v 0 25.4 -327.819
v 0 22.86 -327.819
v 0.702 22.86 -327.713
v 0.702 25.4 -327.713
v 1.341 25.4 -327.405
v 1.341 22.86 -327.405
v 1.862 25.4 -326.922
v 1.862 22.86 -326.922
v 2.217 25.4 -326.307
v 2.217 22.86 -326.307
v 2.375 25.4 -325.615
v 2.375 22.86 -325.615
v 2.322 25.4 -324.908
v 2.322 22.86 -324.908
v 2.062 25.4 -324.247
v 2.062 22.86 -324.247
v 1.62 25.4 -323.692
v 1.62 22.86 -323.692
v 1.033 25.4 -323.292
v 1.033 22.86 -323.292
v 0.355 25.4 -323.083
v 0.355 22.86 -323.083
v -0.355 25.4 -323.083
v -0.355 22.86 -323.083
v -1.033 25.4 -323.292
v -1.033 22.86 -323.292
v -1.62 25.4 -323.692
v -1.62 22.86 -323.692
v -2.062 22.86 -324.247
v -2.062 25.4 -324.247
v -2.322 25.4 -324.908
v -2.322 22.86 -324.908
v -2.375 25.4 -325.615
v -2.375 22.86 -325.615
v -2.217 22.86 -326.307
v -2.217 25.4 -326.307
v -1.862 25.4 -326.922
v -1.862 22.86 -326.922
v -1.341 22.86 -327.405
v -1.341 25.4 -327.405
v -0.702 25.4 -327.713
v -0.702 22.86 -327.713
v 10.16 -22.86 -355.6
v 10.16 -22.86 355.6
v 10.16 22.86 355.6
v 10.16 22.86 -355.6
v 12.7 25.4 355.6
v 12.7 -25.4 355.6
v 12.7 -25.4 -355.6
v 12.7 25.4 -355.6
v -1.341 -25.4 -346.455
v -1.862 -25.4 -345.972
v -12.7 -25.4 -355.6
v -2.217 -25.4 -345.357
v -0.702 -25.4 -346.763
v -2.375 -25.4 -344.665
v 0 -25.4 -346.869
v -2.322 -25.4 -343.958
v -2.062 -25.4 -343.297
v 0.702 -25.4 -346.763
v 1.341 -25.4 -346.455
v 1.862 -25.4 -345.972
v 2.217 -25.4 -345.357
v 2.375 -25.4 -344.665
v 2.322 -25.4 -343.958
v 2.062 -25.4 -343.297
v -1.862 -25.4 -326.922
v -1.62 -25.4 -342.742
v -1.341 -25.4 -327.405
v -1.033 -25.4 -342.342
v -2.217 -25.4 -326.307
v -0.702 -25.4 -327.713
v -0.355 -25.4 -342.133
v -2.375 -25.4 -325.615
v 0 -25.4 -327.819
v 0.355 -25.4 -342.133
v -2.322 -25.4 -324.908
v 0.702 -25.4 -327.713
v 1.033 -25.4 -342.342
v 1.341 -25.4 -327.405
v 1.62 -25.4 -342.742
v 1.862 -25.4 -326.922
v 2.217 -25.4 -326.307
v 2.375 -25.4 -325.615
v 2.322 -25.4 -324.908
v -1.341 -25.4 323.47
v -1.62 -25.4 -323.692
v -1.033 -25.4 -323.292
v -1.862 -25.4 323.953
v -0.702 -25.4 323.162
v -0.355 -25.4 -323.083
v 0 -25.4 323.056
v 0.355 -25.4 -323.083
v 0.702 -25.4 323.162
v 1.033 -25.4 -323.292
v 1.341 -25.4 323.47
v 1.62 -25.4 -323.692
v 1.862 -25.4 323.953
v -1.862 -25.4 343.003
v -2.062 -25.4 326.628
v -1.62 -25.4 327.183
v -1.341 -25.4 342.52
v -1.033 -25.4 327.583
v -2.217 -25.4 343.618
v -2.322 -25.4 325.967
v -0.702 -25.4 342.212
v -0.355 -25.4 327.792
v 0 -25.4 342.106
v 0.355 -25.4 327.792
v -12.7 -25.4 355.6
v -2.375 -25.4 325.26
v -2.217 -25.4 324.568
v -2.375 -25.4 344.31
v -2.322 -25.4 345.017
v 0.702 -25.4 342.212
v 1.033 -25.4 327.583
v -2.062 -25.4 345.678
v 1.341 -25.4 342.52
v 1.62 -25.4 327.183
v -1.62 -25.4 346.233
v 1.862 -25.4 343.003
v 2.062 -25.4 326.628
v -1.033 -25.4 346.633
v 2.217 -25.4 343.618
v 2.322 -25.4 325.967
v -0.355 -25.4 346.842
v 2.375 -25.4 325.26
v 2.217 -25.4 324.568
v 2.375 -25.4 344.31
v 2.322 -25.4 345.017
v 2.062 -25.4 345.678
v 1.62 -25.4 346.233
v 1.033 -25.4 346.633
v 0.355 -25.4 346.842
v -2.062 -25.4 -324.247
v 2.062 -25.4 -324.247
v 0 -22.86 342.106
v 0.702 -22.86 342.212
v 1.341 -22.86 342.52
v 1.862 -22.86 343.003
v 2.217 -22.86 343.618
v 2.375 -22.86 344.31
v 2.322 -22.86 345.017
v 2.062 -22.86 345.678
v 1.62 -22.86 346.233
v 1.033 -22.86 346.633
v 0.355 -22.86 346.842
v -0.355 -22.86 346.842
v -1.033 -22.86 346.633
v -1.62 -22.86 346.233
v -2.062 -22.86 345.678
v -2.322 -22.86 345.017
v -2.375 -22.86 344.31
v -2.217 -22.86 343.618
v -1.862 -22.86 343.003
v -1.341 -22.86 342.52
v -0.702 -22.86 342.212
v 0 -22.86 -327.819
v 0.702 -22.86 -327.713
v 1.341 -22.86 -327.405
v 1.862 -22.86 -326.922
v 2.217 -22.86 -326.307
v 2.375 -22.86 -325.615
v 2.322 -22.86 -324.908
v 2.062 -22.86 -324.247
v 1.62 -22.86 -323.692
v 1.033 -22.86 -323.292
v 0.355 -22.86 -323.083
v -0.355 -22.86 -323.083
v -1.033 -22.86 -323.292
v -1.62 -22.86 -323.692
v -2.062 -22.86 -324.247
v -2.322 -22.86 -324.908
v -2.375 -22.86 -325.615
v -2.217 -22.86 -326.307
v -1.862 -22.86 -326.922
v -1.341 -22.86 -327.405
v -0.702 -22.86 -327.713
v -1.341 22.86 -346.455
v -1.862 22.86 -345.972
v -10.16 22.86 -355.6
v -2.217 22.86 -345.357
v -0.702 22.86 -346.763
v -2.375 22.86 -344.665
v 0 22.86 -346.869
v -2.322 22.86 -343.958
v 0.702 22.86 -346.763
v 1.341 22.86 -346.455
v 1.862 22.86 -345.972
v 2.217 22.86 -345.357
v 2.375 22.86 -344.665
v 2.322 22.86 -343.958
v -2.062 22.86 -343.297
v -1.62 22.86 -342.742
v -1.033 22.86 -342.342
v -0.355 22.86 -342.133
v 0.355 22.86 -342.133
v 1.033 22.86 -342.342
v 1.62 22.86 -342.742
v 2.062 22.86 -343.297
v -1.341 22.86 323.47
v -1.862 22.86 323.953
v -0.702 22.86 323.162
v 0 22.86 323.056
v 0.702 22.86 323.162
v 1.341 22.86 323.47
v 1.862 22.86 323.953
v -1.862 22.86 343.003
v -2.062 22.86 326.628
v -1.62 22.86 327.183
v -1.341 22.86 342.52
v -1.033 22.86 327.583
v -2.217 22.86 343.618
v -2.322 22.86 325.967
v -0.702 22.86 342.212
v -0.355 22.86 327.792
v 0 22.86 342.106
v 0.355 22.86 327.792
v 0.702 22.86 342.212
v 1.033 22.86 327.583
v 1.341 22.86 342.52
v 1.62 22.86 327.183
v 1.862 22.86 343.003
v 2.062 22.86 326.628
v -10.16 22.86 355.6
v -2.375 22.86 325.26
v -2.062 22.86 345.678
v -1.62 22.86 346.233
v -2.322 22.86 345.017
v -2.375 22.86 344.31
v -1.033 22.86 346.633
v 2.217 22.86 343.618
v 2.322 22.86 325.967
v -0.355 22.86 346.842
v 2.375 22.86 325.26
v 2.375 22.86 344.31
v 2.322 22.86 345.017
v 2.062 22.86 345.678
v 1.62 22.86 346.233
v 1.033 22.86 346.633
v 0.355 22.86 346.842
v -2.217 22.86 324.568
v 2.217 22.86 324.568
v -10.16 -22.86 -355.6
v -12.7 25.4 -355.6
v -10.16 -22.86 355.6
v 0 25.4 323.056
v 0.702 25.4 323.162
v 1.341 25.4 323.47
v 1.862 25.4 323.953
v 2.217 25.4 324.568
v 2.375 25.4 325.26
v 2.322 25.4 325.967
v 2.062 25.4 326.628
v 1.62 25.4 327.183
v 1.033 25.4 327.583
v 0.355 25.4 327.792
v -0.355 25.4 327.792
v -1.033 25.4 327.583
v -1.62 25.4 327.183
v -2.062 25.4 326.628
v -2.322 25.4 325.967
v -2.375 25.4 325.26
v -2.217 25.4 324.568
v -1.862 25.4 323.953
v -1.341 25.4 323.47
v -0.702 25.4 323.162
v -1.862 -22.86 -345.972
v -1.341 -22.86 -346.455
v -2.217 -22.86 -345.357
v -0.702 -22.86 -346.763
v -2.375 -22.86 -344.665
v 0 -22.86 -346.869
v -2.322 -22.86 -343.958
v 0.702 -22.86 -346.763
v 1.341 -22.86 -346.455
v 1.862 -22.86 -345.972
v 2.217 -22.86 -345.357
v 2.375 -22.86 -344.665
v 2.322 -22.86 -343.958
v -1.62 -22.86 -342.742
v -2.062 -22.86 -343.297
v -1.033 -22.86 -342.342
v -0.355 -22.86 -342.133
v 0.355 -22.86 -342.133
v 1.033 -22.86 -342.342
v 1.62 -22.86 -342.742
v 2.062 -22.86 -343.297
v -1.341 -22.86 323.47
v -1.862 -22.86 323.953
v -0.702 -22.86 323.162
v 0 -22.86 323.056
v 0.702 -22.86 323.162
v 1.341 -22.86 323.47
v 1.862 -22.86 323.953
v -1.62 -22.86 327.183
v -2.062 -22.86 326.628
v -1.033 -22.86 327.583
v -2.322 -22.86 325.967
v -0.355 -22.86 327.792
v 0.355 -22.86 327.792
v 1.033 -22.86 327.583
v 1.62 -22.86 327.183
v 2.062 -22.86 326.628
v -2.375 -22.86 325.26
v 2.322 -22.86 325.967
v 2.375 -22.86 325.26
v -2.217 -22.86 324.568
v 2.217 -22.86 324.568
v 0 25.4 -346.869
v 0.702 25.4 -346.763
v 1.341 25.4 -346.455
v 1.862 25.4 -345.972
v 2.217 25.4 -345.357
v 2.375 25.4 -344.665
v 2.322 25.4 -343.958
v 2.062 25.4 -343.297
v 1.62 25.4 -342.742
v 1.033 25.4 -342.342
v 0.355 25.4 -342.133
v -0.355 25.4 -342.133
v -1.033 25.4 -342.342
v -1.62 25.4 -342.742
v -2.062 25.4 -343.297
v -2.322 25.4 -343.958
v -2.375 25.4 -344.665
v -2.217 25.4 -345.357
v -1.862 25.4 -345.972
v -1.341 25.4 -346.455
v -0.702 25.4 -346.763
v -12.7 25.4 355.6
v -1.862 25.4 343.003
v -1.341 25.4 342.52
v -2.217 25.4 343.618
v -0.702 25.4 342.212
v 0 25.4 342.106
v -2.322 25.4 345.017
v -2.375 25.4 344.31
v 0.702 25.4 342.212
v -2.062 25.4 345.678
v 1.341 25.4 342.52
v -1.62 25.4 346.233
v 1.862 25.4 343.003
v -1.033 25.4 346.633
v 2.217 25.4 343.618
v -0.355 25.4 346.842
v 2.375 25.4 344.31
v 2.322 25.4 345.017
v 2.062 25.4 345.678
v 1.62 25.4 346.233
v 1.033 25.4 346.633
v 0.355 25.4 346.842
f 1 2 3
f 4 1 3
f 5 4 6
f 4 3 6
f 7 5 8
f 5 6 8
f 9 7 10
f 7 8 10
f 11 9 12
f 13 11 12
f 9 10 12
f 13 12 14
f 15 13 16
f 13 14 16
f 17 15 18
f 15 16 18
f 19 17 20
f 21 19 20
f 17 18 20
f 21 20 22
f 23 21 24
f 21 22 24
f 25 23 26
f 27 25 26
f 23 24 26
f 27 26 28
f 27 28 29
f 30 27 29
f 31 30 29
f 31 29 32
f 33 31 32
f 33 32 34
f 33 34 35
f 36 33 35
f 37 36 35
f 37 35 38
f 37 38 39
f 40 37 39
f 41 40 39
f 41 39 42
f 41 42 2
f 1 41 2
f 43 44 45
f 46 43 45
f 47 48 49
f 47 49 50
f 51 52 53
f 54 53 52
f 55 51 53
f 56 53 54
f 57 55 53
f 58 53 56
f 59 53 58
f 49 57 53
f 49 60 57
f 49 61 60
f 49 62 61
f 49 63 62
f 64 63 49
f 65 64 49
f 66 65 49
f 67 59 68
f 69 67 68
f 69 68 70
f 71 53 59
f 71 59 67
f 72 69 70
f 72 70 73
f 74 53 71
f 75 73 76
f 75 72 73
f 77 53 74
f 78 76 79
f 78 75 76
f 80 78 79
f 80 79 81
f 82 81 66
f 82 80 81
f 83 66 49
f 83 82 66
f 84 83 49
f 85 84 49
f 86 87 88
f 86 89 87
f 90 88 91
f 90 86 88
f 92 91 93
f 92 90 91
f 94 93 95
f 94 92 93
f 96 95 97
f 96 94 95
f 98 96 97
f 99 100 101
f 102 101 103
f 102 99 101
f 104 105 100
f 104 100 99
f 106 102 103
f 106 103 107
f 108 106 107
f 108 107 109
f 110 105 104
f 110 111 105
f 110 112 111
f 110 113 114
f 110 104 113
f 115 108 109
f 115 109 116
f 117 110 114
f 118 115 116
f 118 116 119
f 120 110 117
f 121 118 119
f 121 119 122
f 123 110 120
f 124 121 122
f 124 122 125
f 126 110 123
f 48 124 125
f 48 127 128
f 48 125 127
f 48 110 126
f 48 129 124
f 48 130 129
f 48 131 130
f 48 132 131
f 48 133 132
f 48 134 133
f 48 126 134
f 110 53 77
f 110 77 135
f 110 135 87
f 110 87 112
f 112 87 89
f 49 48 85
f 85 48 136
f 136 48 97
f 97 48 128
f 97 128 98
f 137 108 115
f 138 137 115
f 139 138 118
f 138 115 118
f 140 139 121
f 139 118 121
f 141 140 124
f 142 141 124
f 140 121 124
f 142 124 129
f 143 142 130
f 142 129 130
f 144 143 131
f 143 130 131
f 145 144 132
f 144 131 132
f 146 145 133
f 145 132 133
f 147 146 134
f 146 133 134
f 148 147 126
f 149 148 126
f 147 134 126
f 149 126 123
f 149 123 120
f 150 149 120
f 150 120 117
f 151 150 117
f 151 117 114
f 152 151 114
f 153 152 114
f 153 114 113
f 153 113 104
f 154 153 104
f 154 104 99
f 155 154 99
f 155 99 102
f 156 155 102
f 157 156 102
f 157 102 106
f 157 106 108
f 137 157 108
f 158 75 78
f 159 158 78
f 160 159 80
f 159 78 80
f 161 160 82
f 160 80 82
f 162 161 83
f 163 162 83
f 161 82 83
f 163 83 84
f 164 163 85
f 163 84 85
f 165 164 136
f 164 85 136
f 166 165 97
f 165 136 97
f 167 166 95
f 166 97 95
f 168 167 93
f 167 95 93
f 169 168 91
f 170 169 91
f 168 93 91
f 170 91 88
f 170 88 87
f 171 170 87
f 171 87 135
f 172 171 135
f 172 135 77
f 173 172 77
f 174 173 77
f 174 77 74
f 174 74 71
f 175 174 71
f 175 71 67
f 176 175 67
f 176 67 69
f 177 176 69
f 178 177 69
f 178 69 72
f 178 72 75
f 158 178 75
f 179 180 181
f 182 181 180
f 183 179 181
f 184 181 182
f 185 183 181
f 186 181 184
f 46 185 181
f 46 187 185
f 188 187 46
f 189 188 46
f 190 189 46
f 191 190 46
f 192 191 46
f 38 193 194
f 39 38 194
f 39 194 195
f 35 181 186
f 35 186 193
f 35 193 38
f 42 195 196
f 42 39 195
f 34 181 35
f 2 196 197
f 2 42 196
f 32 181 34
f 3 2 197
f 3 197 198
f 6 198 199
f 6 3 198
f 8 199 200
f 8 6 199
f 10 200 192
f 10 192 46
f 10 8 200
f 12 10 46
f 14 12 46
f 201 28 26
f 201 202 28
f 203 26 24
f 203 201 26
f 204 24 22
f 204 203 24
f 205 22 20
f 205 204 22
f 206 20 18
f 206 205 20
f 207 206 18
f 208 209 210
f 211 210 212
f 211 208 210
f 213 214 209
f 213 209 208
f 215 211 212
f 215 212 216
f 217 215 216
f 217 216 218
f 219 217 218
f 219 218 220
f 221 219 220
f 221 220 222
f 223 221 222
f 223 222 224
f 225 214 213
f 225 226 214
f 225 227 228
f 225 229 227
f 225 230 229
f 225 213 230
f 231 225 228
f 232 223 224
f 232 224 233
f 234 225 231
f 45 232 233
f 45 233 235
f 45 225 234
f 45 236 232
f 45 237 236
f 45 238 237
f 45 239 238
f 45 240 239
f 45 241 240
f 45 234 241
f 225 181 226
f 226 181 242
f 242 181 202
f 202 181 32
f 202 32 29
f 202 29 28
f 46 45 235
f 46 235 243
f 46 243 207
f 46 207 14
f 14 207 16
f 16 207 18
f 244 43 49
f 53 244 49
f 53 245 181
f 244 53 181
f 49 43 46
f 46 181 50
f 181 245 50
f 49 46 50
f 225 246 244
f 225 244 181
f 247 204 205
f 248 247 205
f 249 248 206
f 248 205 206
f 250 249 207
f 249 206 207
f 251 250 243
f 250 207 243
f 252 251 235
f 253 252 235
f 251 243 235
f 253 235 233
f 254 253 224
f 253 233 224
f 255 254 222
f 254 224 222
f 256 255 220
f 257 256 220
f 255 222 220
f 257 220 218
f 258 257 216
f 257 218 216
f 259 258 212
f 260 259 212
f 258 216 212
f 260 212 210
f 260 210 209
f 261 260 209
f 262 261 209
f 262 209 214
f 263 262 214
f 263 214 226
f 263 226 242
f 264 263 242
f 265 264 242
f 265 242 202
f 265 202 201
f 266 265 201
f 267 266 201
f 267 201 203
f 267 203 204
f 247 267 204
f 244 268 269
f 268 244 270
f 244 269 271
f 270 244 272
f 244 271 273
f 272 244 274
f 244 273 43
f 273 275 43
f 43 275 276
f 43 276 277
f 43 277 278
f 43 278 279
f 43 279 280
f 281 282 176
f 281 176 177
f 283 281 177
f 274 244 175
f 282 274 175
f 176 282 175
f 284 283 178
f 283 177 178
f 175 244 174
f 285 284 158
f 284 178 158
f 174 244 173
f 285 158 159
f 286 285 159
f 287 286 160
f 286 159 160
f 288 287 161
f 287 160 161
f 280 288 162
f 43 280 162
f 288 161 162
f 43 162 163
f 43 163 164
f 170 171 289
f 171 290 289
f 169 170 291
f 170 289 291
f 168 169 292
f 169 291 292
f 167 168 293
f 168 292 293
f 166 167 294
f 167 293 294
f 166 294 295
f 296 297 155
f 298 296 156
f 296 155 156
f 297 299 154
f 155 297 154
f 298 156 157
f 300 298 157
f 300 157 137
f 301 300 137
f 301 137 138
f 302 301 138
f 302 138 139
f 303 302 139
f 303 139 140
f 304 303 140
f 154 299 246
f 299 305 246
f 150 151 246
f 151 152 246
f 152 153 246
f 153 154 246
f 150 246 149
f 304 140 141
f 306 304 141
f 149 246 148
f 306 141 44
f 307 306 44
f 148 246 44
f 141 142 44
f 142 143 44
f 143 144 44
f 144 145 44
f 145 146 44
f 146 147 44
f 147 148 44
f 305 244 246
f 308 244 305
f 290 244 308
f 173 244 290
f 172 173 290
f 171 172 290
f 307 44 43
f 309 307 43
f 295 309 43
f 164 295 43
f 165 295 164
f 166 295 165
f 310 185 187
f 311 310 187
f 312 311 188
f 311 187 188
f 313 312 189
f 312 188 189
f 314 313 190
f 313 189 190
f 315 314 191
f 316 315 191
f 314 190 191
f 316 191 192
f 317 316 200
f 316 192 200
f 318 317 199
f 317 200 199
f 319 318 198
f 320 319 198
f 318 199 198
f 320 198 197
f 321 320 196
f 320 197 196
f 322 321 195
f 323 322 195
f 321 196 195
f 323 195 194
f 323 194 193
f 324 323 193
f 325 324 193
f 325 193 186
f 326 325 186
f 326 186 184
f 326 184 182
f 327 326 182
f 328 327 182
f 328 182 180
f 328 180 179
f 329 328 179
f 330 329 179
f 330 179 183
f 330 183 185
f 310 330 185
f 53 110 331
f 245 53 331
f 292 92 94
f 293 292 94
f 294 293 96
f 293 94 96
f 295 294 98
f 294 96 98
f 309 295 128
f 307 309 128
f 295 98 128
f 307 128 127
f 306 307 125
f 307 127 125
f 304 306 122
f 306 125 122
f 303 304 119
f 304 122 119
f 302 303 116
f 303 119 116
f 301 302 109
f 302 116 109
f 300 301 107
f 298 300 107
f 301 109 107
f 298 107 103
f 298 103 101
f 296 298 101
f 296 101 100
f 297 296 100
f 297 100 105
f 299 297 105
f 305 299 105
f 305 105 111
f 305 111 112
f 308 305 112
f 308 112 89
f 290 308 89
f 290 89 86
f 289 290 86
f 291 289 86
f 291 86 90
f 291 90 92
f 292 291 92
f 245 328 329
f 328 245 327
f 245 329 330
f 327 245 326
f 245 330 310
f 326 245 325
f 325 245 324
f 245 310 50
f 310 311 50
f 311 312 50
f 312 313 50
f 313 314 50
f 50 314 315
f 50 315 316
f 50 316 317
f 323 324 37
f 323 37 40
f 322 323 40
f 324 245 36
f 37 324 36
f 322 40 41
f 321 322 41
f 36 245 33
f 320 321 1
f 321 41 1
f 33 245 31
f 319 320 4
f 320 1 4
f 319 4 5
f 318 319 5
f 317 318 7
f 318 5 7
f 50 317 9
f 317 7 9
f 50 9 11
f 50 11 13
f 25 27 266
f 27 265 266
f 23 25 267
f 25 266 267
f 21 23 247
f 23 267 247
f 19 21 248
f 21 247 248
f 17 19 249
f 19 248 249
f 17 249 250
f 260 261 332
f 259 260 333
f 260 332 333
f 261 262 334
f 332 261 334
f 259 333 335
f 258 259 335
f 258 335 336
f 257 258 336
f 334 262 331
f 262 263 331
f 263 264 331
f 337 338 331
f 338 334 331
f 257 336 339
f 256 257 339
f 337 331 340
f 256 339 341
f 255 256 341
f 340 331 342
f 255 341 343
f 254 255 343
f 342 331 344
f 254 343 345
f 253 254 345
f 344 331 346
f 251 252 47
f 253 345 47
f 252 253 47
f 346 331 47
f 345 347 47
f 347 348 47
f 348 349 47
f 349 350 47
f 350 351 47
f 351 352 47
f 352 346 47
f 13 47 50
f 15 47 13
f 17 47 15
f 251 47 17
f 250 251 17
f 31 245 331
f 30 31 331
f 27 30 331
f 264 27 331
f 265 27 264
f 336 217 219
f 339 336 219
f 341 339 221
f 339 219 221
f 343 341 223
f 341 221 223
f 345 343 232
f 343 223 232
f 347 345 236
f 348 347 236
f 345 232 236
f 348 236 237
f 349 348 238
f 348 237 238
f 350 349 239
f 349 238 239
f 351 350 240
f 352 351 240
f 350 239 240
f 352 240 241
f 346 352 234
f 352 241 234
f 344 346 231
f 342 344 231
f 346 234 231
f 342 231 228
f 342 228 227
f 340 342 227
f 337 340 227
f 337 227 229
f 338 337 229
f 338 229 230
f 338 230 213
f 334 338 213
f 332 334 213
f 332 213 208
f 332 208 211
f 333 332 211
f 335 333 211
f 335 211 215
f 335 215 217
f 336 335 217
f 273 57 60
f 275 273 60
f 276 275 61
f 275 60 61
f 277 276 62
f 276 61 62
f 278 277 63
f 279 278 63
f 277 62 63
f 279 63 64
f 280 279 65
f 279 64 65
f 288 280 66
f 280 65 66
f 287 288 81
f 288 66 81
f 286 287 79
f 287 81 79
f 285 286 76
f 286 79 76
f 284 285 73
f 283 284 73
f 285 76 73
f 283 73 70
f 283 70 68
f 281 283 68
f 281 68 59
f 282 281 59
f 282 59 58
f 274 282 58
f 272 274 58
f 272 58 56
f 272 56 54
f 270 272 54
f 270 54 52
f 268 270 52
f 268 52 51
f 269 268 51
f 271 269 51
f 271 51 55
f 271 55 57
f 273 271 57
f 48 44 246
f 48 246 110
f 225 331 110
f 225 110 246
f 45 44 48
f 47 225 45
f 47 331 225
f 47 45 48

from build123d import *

# Parameters (mm, degrees)
SKETCH1_W           = 25.4
SKETCH1_H           = 50.8
BOSS_EXTRUDE1_DEPTH = 355.6
SHELL1_T            = -2.54
SKETCH2_R           = 2.38125
CUT_EXTRUDE1_DEPTH  = 360.434681131


with BuildPart() as part:
    # Sketch1 → Boss-Extrude1 (new, symmetric)
    with BuildSketch(Plane.XY):
        Rectangle(SKETCH1_W, SKETCH1_H)
    extrude(amount=BOSS_EXTRUDE1_DEPTH, both=True)

    # Shell1
    shell1_openings = [part.faces().sort_by_distance(p)[0] for p in [
        (0, 0, 355.6),
        (0, 0, -355.6),
    ]]
    offset(amount=SHELL1_T, openings=shell1_openings, kind=Kind.INTERSECTION)

    # Sketch2 → Cut-Extrude1 (cut, through all)
    with BuildSketch(Plane.XZ.offset(25.4)):
        with Locations(Location((0, 344.4875, 0), (0, 0, 270))):
            Circle(SKETCH2_R)
        with Locations(Location((0, 325.4375, 0), (0, 0, 270))):
            Circle(SKETCH2_R)
        with Locations(Location((0, -325.4375, 0), (0, 0, 270))):
            Circle(SKETCH2_R)
        with Locations(Location((0, -344.4875, 0), (0, 0, 270))):
            Circle(SKETCH2_R)
    extrude(amount=-CUT_EXTRUDE1_DEPTH, mode=Mode.SUBTRACT)


solid = part.part
